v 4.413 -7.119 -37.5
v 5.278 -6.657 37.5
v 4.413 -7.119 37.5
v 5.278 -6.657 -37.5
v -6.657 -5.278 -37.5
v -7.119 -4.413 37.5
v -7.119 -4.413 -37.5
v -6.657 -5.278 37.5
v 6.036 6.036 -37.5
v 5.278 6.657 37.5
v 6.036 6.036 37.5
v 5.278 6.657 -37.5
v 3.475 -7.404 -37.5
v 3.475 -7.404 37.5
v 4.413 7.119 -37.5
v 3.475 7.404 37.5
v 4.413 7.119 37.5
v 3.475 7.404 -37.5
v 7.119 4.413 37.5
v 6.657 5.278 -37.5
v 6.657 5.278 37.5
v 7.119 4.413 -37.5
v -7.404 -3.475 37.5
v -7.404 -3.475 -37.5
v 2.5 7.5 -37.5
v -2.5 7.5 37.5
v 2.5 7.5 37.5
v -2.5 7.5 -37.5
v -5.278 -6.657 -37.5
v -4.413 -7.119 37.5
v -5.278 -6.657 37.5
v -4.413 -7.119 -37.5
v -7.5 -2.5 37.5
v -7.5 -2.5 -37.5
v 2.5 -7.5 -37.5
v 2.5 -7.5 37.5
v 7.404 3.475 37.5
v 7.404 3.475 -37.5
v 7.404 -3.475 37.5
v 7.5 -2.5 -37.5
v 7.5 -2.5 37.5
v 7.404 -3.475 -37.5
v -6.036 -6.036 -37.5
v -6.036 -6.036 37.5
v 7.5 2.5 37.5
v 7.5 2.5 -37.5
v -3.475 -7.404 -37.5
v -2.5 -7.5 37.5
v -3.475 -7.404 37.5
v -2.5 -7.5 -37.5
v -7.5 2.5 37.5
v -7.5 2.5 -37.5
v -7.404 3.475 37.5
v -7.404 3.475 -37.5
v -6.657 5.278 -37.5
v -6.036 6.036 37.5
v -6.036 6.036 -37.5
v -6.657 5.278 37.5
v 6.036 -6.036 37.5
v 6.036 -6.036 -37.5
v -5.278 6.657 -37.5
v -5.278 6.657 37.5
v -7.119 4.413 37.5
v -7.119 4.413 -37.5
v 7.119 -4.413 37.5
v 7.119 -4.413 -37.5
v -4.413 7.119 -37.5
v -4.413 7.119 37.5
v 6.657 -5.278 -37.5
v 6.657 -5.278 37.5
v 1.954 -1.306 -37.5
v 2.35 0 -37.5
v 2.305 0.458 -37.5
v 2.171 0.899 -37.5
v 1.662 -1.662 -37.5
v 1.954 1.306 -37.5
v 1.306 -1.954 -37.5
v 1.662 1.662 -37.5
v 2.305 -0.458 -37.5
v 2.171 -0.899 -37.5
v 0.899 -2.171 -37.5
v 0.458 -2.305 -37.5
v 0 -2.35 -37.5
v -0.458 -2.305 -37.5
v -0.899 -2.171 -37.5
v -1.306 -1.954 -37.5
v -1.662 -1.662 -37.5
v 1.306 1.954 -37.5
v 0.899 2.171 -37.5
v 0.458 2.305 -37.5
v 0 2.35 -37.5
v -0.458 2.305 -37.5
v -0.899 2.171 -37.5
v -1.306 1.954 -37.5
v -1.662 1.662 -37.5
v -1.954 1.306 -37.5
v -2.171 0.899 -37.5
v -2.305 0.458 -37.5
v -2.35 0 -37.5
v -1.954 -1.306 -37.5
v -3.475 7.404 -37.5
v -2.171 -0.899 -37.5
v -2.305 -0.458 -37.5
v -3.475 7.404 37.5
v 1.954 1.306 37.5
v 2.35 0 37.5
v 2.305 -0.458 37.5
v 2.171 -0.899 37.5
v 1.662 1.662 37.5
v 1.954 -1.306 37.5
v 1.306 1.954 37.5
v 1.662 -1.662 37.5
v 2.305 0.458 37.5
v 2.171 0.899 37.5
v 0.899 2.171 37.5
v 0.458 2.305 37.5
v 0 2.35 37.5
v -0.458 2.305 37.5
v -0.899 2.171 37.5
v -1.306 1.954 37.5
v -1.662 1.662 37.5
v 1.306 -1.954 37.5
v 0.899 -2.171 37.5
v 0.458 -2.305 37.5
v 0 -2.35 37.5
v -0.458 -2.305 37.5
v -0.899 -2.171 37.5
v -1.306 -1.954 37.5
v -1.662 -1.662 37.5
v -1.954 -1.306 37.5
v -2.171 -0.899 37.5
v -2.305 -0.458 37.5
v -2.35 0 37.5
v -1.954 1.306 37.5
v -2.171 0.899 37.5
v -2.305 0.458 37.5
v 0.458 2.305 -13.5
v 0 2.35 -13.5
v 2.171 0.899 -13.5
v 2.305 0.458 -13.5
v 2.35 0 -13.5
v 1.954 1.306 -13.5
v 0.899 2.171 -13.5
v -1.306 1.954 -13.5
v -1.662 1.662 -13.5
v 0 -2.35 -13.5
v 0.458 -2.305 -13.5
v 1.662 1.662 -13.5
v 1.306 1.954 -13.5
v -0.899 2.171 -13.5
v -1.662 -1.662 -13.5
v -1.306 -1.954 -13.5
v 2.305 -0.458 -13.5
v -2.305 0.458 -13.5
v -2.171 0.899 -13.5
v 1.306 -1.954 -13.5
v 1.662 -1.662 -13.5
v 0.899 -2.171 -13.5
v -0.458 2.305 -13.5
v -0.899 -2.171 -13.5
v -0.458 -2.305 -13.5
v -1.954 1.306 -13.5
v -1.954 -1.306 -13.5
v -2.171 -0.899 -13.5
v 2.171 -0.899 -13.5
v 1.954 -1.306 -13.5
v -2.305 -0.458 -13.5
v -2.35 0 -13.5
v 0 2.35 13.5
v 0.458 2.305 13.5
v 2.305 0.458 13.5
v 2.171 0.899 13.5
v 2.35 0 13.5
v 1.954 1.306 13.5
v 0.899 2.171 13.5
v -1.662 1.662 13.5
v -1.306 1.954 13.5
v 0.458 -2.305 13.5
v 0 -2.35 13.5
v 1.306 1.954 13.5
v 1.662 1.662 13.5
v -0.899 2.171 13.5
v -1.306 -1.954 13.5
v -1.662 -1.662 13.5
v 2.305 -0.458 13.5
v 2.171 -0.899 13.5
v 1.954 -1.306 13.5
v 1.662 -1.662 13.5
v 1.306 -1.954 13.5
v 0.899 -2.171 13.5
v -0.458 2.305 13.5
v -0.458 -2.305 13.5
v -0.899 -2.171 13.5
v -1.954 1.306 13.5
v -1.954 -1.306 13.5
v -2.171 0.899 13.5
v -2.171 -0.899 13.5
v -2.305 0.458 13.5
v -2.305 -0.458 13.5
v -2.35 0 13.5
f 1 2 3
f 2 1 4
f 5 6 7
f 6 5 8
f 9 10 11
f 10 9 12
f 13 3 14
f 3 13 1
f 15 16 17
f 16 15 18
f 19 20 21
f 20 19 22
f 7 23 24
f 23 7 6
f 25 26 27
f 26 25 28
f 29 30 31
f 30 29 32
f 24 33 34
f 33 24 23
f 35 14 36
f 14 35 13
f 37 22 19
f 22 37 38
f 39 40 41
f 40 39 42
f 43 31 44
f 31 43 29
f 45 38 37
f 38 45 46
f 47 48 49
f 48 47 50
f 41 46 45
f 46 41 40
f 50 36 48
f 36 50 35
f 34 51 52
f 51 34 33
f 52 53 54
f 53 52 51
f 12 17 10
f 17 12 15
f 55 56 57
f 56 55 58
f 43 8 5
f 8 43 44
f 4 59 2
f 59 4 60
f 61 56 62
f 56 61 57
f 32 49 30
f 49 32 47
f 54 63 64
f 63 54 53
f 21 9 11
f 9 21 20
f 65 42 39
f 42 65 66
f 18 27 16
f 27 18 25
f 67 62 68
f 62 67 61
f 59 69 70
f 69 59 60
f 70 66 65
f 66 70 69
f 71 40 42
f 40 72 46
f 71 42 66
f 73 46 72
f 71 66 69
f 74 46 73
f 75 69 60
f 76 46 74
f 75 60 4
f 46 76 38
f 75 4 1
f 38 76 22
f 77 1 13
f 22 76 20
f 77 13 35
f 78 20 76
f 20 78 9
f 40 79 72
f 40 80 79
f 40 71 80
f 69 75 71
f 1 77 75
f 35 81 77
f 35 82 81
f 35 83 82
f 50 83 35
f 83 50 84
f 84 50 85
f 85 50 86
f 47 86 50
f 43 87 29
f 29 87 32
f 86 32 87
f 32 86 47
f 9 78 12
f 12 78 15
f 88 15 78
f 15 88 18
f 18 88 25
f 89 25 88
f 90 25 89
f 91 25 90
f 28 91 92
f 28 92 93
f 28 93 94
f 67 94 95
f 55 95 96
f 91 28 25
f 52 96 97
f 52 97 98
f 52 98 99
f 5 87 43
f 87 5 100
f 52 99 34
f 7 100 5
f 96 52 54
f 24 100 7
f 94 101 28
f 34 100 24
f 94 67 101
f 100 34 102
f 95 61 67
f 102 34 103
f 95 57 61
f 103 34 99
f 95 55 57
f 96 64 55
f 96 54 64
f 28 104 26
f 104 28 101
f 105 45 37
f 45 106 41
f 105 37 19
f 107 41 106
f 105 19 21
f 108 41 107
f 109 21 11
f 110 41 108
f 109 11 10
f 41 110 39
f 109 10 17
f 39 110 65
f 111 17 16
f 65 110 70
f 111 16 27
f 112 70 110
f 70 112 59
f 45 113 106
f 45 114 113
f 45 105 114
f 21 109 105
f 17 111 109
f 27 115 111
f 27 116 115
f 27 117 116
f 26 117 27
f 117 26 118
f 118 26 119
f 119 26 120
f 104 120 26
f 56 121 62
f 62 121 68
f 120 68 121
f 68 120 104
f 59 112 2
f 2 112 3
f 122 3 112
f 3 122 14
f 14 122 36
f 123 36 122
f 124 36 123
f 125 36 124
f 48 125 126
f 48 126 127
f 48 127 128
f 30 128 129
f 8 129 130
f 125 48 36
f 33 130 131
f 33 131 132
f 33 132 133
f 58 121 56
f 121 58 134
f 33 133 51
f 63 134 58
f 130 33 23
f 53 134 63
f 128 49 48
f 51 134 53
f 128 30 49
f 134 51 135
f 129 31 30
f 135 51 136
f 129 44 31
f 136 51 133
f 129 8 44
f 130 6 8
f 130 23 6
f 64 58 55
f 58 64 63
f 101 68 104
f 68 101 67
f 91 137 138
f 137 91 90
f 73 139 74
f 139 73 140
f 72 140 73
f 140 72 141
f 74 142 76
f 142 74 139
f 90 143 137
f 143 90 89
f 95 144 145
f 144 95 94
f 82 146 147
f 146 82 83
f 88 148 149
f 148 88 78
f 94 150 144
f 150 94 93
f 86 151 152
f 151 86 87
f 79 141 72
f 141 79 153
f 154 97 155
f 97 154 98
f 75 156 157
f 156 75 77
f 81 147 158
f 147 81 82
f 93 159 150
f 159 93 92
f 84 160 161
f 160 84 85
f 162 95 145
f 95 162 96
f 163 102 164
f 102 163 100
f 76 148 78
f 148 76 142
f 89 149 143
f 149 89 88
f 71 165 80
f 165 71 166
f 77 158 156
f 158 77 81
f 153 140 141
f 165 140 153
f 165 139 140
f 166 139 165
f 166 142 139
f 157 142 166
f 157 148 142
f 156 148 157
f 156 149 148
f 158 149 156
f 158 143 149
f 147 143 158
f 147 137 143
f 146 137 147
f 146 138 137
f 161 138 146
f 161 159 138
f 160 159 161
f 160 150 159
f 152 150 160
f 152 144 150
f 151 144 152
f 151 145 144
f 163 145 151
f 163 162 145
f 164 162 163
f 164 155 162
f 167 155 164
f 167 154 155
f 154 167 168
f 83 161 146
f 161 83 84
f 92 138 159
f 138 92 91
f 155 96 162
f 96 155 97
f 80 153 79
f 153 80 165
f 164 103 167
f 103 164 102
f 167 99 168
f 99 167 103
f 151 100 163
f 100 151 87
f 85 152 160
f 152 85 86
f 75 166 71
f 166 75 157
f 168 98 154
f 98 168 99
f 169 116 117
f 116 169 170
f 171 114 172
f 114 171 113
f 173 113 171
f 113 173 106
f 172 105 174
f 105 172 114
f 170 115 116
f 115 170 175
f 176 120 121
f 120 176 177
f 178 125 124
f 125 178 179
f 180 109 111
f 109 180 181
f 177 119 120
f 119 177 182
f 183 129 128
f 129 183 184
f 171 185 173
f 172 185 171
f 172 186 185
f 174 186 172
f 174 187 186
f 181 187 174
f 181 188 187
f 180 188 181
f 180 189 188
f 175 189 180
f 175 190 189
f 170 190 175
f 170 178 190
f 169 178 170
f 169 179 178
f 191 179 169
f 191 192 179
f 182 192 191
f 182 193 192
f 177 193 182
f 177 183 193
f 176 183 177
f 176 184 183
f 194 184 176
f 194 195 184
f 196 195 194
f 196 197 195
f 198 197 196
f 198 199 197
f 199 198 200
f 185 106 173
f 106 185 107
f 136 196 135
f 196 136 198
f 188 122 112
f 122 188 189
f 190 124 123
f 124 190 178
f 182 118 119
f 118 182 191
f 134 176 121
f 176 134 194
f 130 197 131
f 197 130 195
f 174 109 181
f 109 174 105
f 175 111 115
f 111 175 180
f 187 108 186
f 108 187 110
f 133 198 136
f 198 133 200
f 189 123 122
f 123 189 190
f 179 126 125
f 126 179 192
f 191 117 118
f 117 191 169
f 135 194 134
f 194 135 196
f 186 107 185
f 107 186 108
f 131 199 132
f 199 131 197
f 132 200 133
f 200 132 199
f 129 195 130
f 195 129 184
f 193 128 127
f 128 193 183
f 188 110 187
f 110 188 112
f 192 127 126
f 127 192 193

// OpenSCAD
// file: roundedcube.scad
// Higher definition curves
$fs = 0.01;

module roundedcube(size = [1, 1, 1], center = false, radius = 0.5, apply_to = "all") {
	// If single value, convert to [x, y, z] vector
	size = (size[0] == undef) ? [size, size, size] : size;

	translate_min = radius;
	translate_xmax = size[0] - radius;
	translate_ymax = size[1] - radius;
	translate_zmax = size[2] - radius;

	diameter = radius * 2;

	module build_point(type = "sphere", rotate = [0, 0, 0]) {
		if (type == "sphere") {
			sphere(r = radius);
		} else if (type == "cylinder") {
			rotate(a = rotate)
			cylinder(h = diameter, r = radius, center = true);
		}
	}

	obj_translate = (center == false) ?
		[0, 0, 0] : [
			-(size[0] / 2),
			-(size[1] / 2),
			-(size[2] / 2)
		];

	translate(v = obj_translate) {
		hull() {
			for (translate_x = [translate_min, translate_xmax]) {
				x_at = (translate_x == translate_min) ? "min" : "max";
				for (translate_y = [translate_min, translate_ymax]) {
					y_at = (translate_y == translate_min) ? "min" : "max";
					for (translate_z = [translate_min, translate_zmax]) {
						z_at = (translate_z == translate_min) ? "min" : "max";

						translate(v = [translate_x, translate_y, translate_z])
						if (
							(apply_to == "all") ||
							(apply_to == "xmin" && x_at == "min") || (apply_to == "xmax" && x_at == "max") ||
							(apply_to == "ymin" && y_at == "min") || (apply_to == "ymax" && y_at == "max") ||
							(apply_to == "zmin" && z_at == "min") || (apply_to == "zmax" && z_at == "max")
						) {
							build_point("sphere");
						} else {
							rotate =
								(apply_to == "xmin" || apply_to == "xmax" || apply_to == "x") ? [0, 90, 0] : (
								(apply_to == "ymin" || apply_to == "ymax" || apply_to == "y") ? [90, 90, 0] :
								[0, 0, 0]
							);
							build_point("cylinder", rotate);
						}
					}
				}
			}
		}
	}
}

module roundedcubez(size = [1, 1, 1], center = false, radius = 0.5, apply_to = "all") {
	intersection() {
		roundedcube(size, center, radius, apply_to="z");
		scale([1.0, 1.0, 1.1])
			cube(size, center);
	}
}
// main file
$fn=32;

include <roundedcube.scad>


difference() {
	roundedcubez(size=[15, 15, 75], center=true, radius=5);
	for (i=[-1, 1])
		translate([0, 0, (75 / 2 - 9) * i])
			cylinder(h=30, d=4.7, center=true);
}
